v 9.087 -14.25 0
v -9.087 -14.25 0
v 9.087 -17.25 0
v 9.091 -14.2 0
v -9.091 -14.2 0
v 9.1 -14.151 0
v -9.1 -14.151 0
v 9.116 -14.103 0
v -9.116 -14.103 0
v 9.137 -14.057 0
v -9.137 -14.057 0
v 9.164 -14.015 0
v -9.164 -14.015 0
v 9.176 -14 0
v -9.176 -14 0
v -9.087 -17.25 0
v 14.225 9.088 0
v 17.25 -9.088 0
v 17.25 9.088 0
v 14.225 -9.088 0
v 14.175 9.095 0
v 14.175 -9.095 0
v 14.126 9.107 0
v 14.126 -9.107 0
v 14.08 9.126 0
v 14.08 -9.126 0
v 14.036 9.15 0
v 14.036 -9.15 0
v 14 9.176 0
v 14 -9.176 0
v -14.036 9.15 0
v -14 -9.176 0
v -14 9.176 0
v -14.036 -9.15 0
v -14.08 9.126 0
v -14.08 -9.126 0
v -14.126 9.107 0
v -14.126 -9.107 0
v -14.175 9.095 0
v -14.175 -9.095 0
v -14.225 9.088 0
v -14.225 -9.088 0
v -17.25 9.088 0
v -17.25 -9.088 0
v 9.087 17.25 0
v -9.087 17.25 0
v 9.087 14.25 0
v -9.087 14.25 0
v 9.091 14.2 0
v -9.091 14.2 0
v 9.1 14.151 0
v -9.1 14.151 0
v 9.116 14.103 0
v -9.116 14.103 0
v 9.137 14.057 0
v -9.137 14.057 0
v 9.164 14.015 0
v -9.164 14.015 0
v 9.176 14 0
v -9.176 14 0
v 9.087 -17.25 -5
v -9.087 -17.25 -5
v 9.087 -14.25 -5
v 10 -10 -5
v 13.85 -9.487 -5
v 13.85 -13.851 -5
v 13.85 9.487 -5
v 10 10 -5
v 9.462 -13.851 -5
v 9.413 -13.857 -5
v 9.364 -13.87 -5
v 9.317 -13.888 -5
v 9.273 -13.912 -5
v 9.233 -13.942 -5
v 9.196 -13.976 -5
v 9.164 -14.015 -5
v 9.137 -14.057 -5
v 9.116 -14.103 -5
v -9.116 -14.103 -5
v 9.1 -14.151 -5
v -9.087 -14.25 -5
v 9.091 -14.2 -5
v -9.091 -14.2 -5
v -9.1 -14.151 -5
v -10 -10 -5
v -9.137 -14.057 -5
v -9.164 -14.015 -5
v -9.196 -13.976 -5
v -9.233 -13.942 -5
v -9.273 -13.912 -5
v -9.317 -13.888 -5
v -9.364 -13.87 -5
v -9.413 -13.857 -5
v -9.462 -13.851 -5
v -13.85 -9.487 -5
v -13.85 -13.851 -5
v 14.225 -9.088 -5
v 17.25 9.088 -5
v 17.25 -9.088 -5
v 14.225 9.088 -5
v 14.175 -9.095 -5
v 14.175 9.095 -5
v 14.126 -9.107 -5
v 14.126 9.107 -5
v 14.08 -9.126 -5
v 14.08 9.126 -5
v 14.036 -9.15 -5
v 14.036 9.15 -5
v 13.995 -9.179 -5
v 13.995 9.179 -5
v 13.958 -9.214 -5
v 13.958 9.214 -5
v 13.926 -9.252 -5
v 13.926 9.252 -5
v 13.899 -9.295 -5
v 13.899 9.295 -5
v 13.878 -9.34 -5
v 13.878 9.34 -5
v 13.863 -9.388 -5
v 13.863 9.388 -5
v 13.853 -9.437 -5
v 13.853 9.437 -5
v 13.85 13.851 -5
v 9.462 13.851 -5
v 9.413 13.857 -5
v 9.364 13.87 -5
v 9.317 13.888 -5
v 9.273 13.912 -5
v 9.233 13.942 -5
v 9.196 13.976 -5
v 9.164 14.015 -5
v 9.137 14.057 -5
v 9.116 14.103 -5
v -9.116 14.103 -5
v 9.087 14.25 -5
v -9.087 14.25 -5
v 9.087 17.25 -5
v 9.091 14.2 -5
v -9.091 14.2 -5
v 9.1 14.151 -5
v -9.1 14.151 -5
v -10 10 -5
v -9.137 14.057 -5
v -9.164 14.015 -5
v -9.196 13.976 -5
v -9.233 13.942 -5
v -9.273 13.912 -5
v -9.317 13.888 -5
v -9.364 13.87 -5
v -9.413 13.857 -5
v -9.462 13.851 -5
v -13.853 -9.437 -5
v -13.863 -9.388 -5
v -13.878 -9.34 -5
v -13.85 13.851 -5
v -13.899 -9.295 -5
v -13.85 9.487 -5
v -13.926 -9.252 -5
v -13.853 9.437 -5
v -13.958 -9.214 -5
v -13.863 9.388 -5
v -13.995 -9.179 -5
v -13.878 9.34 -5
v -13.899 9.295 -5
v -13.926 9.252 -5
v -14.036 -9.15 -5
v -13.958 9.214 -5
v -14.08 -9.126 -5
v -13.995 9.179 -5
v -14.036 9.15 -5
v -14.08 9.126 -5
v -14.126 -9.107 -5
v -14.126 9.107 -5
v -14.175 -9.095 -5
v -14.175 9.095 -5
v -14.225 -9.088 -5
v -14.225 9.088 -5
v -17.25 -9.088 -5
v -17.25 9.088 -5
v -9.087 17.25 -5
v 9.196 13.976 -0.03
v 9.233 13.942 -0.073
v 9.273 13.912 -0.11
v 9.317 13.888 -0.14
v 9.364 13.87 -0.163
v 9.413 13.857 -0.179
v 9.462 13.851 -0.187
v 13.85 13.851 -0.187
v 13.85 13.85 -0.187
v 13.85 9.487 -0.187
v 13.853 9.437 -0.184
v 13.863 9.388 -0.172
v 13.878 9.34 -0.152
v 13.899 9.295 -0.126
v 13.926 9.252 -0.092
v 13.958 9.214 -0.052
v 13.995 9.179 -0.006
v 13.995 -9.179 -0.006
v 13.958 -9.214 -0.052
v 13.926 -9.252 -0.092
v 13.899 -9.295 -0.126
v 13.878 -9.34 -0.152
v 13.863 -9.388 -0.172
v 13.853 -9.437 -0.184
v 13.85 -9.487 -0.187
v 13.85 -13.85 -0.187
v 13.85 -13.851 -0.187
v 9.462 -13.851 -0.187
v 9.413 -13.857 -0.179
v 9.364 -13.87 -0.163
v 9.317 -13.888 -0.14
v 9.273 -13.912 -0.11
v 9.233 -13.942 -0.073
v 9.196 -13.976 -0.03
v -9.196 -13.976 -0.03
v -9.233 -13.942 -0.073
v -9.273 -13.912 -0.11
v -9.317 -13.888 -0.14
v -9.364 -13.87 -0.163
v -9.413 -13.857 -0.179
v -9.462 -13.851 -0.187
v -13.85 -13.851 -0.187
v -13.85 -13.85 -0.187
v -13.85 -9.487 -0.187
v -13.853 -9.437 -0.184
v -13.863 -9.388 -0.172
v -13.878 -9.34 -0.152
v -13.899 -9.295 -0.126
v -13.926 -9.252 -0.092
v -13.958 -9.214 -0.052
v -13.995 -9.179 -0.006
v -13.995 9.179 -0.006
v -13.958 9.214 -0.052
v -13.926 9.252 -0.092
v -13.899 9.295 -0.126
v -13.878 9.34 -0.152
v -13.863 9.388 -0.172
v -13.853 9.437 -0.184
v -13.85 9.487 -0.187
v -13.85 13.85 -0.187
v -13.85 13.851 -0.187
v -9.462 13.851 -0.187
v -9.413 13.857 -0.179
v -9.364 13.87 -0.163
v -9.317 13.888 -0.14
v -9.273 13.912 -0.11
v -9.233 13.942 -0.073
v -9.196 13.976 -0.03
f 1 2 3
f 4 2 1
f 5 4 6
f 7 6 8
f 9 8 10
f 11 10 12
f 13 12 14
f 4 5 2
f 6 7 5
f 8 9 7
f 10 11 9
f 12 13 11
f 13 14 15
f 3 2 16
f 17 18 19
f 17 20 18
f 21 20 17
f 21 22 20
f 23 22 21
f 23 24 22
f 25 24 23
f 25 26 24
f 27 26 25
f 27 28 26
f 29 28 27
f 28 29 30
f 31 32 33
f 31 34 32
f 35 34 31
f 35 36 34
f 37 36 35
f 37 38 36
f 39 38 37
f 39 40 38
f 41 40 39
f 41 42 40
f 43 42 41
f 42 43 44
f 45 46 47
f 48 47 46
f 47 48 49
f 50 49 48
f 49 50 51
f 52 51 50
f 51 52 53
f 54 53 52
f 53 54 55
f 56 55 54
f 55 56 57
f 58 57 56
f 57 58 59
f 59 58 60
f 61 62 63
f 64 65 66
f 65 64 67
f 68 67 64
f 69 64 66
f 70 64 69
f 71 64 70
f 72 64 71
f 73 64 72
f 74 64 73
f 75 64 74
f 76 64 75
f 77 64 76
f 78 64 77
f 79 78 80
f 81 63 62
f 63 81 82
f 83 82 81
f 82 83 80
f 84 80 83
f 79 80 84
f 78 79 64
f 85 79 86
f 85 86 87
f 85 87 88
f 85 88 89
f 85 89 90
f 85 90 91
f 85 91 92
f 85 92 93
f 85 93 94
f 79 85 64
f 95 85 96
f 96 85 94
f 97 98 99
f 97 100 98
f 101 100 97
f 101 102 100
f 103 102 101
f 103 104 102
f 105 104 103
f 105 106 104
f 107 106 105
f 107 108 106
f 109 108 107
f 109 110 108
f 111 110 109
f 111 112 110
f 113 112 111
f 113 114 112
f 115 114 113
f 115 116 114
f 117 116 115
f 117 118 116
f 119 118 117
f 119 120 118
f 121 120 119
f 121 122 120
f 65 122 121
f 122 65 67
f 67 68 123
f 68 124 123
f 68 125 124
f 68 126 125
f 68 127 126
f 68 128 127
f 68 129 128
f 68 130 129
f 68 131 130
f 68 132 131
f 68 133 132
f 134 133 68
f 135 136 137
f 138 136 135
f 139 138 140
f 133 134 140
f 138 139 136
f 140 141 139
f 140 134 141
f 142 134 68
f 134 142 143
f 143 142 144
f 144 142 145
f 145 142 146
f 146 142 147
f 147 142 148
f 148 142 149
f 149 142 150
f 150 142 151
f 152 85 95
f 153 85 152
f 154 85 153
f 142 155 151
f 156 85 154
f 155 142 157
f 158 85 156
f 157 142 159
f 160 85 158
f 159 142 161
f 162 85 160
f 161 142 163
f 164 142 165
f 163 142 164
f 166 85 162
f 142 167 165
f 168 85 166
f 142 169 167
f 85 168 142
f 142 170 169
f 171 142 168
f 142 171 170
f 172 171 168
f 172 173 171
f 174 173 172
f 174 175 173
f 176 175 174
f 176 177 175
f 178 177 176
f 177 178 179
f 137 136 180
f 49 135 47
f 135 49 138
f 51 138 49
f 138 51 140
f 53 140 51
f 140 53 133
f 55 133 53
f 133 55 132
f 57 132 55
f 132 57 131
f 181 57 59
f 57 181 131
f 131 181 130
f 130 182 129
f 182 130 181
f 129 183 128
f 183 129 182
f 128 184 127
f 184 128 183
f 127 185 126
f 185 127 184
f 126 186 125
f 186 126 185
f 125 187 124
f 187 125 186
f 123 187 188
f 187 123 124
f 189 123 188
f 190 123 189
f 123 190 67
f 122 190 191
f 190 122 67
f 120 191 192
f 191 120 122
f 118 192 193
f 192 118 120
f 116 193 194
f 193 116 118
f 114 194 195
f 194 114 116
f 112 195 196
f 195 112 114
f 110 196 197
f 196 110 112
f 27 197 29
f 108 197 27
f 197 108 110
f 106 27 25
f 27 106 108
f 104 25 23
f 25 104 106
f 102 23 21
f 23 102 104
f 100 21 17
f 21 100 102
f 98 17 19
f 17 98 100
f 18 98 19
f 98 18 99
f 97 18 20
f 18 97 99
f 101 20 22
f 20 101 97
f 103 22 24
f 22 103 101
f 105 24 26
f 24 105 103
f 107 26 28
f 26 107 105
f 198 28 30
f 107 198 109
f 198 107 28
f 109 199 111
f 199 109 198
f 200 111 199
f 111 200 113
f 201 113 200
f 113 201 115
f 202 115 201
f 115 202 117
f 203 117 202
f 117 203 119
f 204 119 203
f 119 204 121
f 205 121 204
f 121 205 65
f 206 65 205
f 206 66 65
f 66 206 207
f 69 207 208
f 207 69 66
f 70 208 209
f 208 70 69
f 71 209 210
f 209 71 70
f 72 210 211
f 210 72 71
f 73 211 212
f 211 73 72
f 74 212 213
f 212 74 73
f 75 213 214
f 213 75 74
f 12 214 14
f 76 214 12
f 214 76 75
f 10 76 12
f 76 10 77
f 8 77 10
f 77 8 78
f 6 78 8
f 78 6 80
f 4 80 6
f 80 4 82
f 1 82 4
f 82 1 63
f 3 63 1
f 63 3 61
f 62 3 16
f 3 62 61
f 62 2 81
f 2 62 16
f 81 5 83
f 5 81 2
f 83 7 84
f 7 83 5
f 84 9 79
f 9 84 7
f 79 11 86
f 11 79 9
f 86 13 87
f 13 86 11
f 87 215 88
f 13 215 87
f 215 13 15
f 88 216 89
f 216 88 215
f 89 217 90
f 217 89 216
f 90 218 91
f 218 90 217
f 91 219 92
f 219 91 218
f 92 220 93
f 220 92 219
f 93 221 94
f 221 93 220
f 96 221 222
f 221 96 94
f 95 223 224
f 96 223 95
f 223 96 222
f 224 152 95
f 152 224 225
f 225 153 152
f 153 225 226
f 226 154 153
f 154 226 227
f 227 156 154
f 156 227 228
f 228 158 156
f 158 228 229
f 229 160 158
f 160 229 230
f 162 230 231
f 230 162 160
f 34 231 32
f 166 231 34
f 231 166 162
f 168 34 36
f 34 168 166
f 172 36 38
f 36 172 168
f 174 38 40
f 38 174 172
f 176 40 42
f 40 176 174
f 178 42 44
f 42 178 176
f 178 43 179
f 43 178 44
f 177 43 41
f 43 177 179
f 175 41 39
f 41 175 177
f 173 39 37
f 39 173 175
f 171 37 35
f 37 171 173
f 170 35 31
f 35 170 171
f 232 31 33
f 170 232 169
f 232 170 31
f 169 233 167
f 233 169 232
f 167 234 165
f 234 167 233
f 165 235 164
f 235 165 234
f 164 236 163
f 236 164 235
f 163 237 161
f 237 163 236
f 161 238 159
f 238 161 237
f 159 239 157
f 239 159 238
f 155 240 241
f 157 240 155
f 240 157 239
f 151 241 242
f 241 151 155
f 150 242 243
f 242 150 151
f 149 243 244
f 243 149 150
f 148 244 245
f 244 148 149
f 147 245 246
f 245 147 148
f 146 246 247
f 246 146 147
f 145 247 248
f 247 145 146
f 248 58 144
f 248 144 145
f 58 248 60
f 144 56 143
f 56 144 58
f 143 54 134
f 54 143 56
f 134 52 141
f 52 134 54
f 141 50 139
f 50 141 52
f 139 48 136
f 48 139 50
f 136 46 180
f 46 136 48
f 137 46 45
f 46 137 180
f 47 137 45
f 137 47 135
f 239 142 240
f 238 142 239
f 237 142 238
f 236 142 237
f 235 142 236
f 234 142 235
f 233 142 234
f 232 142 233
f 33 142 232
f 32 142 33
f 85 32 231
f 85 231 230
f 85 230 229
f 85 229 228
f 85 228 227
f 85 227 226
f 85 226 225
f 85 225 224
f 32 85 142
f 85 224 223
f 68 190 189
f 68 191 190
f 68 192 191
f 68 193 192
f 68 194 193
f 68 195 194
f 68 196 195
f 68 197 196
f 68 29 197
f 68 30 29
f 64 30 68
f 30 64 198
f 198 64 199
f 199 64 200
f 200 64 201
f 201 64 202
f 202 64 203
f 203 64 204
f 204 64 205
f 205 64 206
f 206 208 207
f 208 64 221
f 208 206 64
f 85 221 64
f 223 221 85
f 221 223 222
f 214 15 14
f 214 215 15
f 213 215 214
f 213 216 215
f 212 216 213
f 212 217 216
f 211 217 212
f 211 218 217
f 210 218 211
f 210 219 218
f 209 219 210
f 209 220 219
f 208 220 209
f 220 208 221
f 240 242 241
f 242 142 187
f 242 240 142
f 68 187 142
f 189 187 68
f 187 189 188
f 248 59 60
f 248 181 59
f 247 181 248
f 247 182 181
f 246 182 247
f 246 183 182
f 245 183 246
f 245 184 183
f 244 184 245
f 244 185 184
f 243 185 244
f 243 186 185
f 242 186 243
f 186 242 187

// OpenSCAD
// file: meta.scad
deviceFudge=0.5;//mm, fudge factor to account for printing inaccuracy, shrinkage
PCBThickness=1.6; //mm
pinRecepticalTop=5.5;//mm above pcb that the pin receptical extends
pinsHeight=pinRecepticalTop+4.2+2;//mm above pcb, fully extended
maxSubstrateThickness=3;//mm
wallT=3;//mm, wall thickness
PCBShelfW=0.6;//mm, the pcb sits on this
belowPBC=1;//mm extension below PCB
crownFraction=0.55;//fraction of each side length to subtract to make extension corners

solidHeight=pinsHeight;//mm above pcb for solid wall
crownHeight=maxSubstrateThickness+0.5;//mm, corners extension above pin ends
totalHeight=belowPBC+PCBThickness+solidHeight+crownHeight;

module base ( xyDev ) {
    vDeviceDim=xyDev+deviceFudge;
    xyLen=vDeviceDim+wallT*2;
    difference(){
        cube([xyLen,xyLen,totalHeight],center = true);
        translate([0,0,belowPBC]) cube([vDeviceDim,vDeviceDim,totalHeight],center = true);
        cube([vDeviceDim-2*PCBShelfW,vDeviceDim-2*PCBShelfW,totalHeight+1],center = true);
        
        translate([0,xyLen/2,totalHeight/2+(crownHeight+1)/2-crownHeight]) cube([xyLen*crownFraction,xyLen,crownHeight+1],center = true);
        rotate([0,0,180]) translate([-xyLen*crownFraction/2,-xyLen/2,totalHeight/2-crownHeight]) rotate([0,90,0])  linear_extrude(height=xyLen*crownFraction) polygon([[0,0],[0,wallT],[(pinsHeight-pinRecepticalTop),wallT]]);
        
        rotate([0,0,90]) translate([0,xyLen/2,totalHeight/2+(crownHeight+1)/2-crownHeight]) cube([xyLen*crownFraction,xyLen,crownHeight+1],center = true);
        rotate([0,0,270]) translate([-xyLen*crownFraction/2,-xyLen/2,totalHeight/2-crownHeight]) rotate([0,90,0])  linear_extrude(height=xyLen*crownFraction) polygon([[0,0],[0,wallT],[(pinsHeight-pinRecepticalTop),wallT]]);
        
        rotate([0,0,180]) translate([0,xyLen/2,totalHeight/2+(crownHeight+1)/2-crownHeight]) cube([xyLen*crownFraction,xyLen,crownHeight+1],center = true);
        translate([-xyLen*crownFraction/2,-xyLen/2,totalHeight/2-crownHeight]) rotate([0,90,0])  linear_extrude(height=xyLen*crownFraction) polygon([[0,0],[0,wallT],[(pinsHeight-pinRecepticalTop),wallT]]);
        
        rotate([0,0,270]) translate([0,xyLen/2,totalHeight/2+(crownHeight+1)/2-crownHeight]) cube([xyLen*crownFraction,xyLen,crownHeight+1],center = true);
        rotate([0,0,90]) translate([-xyLen*crownFraction/2,-xyLen/2,totalHeight/2-crownHeight]) rotate([0,90,0])  linear_extrude(height=xyLen*crownFraction) polygon([[0,0],[0,wallT],[(pinsHeight-pinRecepticalTop),wallT]]);
    }
}
// main file
include <meta.scad>;

$fn=50;
deviceDim=28; //mm, x,y dimension of substrate, pcb
//deviceDim=30; //mm, x,y dimension of substrate, pcb
//deviceDim=25; //mm, x,y dimension of substrate, pcb, DBG
capFit=0.4; //mm, trace a circle of this radius around the crown pieces to define the cap cutouts
//capX = 39;//mm
//capY = 60;//mm

vDeviceDim=deviceDim+deviceFudge;
xyLen=vDeviceDim+wallT*2;

capX = xyLen;
capY = xyLen;

windowDim = deviceDim-4*2;
capT = 5;
rotate([180,0,0])
difference(){
    linear_extrude(height=capT){
        difference(){
            square([capX,capY], center=true);
            minkowski(){
              projection(cut = true) translate([0,0,-totalHeight/2+1]) base(deviceDim);
              circle(capFit);
            }
            square([windowDim,windowDim], center=true);
        }
    }
    
    linear_extrude(height=capT,scale=windowDim/deviceDim){
        square([deviceDim,deviceDim], center=true);
    }
}
